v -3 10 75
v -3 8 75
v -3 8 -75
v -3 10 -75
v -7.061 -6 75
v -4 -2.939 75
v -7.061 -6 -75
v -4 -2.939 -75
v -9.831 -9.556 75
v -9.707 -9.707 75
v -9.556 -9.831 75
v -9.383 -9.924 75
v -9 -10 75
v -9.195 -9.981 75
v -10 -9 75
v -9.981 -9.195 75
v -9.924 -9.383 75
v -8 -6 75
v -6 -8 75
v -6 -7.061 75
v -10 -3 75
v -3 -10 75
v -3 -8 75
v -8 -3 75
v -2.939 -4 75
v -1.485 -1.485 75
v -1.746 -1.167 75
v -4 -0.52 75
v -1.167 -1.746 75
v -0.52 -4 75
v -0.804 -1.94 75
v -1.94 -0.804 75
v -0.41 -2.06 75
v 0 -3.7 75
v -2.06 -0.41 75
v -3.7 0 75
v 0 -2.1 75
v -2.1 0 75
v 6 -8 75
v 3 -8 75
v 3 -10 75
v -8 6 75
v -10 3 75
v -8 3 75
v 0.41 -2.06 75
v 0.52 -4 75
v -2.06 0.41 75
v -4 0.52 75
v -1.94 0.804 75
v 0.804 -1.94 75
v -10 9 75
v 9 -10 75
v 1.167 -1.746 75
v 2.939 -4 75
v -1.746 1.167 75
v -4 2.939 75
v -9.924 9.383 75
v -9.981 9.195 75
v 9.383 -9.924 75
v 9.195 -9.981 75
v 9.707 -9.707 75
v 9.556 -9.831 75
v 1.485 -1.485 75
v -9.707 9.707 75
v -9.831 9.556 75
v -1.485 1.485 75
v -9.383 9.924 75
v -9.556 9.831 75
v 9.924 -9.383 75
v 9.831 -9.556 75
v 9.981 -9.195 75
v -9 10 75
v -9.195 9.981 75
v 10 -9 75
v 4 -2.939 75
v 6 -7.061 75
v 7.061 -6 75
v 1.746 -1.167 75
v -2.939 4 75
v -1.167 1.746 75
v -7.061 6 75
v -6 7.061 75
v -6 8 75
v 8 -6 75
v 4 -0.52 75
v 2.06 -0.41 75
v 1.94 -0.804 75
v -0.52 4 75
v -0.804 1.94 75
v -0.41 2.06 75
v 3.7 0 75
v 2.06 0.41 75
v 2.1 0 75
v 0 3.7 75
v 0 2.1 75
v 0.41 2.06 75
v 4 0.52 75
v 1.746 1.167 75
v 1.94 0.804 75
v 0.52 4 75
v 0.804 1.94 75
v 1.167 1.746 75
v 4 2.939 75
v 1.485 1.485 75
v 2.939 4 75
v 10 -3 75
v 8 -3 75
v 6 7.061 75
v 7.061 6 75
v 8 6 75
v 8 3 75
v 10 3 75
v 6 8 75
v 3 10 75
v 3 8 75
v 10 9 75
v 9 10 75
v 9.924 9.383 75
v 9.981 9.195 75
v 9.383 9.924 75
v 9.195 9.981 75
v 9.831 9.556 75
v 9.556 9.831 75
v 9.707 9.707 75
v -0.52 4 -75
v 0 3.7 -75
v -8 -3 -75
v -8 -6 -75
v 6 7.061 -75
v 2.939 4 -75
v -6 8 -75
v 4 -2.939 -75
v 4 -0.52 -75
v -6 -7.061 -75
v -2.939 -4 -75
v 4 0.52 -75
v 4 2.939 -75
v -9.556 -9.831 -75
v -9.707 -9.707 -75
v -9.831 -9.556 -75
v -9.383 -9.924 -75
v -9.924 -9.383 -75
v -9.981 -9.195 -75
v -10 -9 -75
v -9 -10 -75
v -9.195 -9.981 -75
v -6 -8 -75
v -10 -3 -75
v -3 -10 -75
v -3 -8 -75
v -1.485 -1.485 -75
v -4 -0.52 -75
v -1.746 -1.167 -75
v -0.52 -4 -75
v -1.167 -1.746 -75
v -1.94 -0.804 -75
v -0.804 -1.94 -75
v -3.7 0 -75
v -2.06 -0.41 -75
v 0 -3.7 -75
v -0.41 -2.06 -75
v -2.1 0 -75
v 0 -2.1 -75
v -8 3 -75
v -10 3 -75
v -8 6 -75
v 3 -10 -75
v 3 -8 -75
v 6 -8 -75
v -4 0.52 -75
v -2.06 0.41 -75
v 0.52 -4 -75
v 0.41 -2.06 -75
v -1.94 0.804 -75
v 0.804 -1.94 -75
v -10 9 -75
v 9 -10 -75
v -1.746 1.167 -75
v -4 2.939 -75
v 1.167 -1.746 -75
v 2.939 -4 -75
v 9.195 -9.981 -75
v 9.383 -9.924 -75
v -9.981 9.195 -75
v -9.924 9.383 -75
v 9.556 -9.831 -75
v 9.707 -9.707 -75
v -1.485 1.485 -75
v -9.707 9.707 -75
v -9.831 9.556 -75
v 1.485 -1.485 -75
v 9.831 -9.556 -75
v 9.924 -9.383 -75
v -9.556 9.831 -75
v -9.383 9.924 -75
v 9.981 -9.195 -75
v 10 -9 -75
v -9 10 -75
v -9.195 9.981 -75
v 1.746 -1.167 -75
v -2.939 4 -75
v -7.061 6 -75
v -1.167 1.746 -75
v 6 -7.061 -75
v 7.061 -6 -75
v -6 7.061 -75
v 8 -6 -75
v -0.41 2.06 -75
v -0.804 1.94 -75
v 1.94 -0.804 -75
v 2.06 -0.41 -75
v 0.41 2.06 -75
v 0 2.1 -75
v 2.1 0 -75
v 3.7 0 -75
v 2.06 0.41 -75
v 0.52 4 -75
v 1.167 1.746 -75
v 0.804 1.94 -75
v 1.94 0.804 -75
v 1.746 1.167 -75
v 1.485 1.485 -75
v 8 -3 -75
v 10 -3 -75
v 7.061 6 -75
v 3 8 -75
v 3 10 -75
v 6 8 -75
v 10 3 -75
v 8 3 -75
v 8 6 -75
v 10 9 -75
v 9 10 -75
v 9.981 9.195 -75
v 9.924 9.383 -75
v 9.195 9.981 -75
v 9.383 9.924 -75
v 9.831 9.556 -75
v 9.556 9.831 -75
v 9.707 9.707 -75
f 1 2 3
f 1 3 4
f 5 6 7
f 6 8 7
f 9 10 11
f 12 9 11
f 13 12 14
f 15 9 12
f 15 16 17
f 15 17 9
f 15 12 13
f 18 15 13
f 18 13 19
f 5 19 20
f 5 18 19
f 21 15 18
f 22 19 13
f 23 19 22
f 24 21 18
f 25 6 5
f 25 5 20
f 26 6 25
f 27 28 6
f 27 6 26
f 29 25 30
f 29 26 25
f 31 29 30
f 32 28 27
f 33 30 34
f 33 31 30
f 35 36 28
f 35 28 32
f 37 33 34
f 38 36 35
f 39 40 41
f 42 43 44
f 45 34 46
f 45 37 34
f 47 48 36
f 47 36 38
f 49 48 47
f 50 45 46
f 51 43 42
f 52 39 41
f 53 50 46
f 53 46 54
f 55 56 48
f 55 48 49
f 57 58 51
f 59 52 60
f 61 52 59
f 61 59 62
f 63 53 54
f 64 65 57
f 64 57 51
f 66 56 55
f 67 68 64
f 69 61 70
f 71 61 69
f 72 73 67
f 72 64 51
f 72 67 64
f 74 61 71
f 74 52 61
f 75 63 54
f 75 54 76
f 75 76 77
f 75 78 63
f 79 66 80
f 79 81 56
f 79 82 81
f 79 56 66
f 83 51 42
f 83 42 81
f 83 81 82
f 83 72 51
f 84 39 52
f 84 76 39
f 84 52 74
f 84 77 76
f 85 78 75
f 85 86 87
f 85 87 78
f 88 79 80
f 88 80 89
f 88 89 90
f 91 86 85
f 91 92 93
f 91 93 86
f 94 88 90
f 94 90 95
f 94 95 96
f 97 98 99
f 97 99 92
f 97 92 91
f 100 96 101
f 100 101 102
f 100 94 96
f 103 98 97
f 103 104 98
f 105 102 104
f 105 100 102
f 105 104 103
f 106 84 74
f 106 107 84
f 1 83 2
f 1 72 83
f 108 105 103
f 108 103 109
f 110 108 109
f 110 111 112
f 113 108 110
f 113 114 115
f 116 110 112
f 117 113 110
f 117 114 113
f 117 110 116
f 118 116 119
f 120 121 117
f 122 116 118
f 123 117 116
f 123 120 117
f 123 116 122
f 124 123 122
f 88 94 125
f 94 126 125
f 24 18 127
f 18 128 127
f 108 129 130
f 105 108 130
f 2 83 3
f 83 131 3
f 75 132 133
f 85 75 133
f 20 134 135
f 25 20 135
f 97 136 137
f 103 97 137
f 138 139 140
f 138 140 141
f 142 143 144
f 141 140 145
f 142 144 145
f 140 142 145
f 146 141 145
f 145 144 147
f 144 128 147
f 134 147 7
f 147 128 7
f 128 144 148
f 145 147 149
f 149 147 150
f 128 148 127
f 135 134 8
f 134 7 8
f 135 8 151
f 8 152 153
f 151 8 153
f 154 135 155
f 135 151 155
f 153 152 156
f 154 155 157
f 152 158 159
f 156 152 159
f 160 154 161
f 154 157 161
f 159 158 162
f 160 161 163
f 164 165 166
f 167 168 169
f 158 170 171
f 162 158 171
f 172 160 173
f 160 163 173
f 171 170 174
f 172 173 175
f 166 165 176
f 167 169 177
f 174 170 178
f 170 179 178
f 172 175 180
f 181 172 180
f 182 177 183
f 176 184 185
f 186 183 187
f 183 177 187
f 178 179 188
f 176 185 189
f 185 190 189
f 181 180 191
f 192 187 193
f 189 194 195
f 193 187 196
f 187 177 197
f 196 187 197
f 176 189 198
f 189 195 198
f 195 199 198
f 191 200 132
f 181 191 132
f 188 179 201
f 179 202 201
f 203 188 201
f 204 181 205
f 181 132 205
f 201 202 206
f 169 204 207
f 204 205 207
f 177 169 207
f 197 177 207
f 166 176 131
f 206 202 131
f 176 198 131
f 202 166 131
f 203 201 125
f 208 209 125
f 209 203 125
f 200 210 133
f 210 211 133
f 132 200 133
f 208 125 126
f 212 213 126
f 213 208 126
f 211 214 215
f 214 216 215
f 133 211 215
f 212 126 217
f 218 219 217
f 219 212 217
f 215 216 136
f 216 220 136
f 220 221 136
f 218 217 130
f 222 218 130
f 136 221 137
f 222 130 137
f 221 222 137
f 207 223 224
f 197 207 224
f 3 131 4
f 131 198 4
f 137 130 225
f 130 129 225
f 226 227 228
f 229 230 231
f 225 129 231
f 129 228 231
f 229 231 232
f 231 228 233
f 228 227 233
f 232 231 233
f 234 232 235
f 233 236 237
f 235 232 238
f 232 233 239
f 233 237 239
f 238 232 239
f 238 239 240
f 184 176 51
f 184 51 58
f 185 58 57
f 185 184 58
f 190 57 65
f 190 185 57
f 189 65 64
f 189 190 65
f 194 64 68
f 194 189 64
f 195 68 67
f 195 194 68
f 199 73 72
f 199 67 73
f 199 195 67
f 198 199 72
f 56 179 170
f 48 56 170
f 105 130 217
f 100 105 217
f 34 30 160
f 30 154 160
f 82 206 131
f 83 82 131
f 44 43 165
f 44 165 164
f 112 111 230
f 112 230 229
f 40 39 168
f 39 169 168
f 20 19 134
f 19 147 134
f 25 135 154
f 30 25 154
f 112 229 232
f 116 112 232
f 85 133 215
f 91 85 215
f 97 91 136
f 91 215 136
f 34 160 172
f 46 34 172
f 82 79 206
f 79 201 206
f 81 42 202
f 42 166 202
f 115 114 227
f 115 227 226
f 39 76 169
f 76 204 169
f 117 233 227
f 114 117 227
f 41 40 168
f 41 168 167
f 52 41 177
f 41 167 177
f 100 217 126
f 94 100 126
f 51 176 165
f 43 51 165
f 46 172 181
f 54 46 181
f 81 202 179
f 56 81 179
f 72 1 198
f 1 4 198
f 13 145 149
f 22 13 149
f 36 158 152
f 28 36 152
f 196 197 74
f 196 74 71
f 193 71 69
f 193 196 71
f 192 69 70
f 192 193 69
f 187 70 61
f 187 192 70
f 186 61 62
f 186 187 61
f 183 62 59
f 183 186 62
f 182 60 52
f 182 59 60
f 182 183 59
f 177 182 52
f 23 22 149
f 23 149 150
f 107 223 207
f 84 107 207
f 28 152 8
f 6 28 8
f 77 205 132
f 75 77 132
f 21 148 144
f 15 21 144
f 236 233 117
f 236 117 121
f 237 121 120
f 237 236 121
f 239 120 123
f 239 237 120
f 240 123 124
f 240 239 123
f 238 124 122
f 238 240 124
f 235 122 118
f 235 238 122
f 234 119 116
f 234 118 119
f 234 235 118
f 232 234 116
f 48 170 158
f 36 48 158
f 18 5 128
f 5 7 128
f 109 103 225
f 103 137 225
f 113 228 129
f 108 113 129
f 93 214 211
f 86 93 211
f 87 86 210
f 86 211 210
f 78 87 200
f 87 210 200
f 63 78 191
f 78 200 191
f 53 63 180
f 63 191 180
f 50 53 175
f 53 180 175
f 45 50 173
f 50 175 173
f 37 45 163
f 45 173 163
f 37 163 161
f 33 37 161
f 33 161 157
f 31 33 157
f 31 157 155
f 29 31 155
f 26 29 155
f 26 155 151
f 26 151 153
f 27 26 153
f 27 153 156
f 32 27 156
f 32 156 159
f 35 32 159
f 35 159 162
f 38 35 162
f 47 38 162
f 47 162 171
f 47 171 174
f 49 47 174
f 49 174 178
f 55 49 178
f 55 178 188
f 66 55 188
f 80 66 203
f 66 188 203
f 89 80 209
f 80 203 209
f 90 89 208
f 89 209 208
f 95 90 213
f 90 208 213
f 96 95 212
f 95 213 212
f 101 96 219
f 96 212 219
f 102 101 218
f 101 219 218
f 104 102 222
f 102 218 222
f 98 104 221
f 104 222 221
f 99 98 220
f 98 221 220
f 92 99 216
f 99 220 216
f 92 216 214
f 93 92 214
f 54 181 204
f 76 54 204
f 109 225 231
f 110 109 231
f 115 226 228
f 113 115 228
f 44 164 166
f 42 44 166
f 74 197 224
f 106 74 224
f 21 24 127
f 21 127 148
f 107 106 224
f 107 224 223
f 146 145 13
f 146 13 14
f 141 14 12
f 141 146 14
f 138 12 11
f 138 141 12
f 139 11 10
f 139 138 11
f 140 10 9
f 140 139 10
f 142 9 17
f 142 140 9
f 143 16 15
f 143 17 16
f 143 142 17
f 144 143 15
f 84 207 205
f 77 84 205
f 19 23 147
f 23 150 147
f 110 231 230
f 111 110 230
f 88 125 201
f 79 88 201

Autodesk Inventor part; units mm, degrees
ref_plane "YZ Plane" through (0, 0, 0) normal (1, 0, 0) x (0, 1, 0)
ref_plane "XZ Plane" through (0, 0, 0) normal (0, 1, 0) x (-1, 0, 0)
ref_plane "XY Plane" through (0, 0, 0) normal (0, 0, 1) x (1, 0, 0)
sketch "Sketch1" plane through (0, 0, 0) normal (0, 0, 1) x (1, 0, 0)
  line L0 (-2.205, 0) -> (2.205, 0)
  line L1 (0, -2.205) -> (0, 2.205)
  arc A0 (9, -10) -> (10, -9) centre (9, -9) ccw
  line L2 (-10, 9) -> (-10, 3)
  line L3 (-10, 3) -> (-8, 3)
  line L4 (-8, 3) -> (-8, 6)
  line L5 (-8, 6) -> (-7.0607, 6)
  line L6 (-7.0607, 6) -> (-4, 2.9393)
  line L7 (-4, 2.9393) -> (-4, 0.5196)
  line L8 (-4, 0.5196) -> (-3.7, 0)
  line L9 (-3.7, 0) -> (-4, -0.5196)
  line L10 (-4, -0.5196) -> (-4, -2.9393)
  line L11 (-4, -2.9393) -> (-7.0607, -6)
  line L12 (-7.0607, -6) -> (-8, -6)
  line L13 (-8, -6) -> (-8, -3)
  line L14 (-8, -3) -> (-10, -3)
  line L15 (-10, -3) -> (-10, -9)
  arc A1 (-10, -9) -> (-9, -10) centre (-9, -9) ccw
  line L16 (-9, -10) -> (-3, -10)
  line L17 (-3, -10) -> (-3, -8)
  line L18 (-3, -8) -> (-6, -8)
  line L19 (-6, -7.0607) -> (-2.9393, -4)
  line L20 (-2.9393, -4) -> (-0.5196, -4)
  line L21 (-0.5196, -4) -> (0, -3.7)
  line L22 (0, -3.7) -> (0.5196, -4)
  line L23 (0.5196, -4) -> (2.9393, -4)
  line L24 (2.9393, -4) -> (6, -7.0607)
  line L25 (6, -7.0607) -> (6, -8)
  line L26 (6, -8) -> (3, -8)
  line L27 (3, -8) -> (3, -10)
  line L28 (3, -10) -> (9, -10)
  line L29 (10, -9) -> (10, -3)
  line L30 (10, -3) -> (8, -3)
  line L31 (8, -3) -> (8, -6)
  line L32 (8, -6) -> (7.0607, -6)
  line L33 (7.0607, -6) -> (4, -2.9393)
  line L34 (4, -2.9393) -> (4, -0.5196)
  line L35 (4, -0.5196) -> (3.7, 0)
  line L36 (3.7, 0) -> (4, 0.5196)
  line L37 (4, 0.5196) -> (4, 2.9393)
  line L38 (4, 2.9393) -> (7.0607, 6)
  line L39 (7.0607, 6) -> (8, 6)
  line L40 (8, 6) -> (8, 3)
  line L41 (8, 3) -> (10, 3)
  line L42 (10, 3) -> (10, 9)
  arc A2 (10, 9) -> (9, 10) centre (9, 9) ccw
  line L43 (9, 10) -> (3, 10)
  line L44 (3, 10) -> (3, 8)
  line L45 (3, 8) -> (6, 8)
  line L46 (6, 8) -> (6, 7.0607)
  line L47 (6, 7.0607) -> (2.9393, 4)
  line L48 (2.9393, 4) -> (0.5196, 4)
  line L49 (0.5196, 4) -> (0, 3.7)
  line L50 (0, 3.7) -> (-0.5196, 4)
  line L51 (-0.5196, 4) -> (-2.9393, 4)
  line L52 (-2.9393, 4) -> (-6, 7.0607)
  line L53 (-6, 7.0607) -> (-6, 8)
  line L54 (-6, 8) -> (-3, 8)
  line L55 (-3, 8) -> (-3, 10)
  line L56 (-3, 10) -> (-9, 10)
  arc A3 (-9, 10) -> (-10, 9) centre (-9, 9) ccw
  circle A4 centre (0, 0) radius 2.1
  line L57 (-6, -8) -> (-6, -7.0607)
extrude "Extrusion1" add sketch "Sketch1" along normal mid plane 150
equation "\"d0\" = width"
equation "\"width\" = 150"
equation "\"panelChamfer\" = 75"
equation "\"suppourtPanelThickness\" = 2.38125"
properties part number "15 cm extrusion" material "Aluminum 6061"
